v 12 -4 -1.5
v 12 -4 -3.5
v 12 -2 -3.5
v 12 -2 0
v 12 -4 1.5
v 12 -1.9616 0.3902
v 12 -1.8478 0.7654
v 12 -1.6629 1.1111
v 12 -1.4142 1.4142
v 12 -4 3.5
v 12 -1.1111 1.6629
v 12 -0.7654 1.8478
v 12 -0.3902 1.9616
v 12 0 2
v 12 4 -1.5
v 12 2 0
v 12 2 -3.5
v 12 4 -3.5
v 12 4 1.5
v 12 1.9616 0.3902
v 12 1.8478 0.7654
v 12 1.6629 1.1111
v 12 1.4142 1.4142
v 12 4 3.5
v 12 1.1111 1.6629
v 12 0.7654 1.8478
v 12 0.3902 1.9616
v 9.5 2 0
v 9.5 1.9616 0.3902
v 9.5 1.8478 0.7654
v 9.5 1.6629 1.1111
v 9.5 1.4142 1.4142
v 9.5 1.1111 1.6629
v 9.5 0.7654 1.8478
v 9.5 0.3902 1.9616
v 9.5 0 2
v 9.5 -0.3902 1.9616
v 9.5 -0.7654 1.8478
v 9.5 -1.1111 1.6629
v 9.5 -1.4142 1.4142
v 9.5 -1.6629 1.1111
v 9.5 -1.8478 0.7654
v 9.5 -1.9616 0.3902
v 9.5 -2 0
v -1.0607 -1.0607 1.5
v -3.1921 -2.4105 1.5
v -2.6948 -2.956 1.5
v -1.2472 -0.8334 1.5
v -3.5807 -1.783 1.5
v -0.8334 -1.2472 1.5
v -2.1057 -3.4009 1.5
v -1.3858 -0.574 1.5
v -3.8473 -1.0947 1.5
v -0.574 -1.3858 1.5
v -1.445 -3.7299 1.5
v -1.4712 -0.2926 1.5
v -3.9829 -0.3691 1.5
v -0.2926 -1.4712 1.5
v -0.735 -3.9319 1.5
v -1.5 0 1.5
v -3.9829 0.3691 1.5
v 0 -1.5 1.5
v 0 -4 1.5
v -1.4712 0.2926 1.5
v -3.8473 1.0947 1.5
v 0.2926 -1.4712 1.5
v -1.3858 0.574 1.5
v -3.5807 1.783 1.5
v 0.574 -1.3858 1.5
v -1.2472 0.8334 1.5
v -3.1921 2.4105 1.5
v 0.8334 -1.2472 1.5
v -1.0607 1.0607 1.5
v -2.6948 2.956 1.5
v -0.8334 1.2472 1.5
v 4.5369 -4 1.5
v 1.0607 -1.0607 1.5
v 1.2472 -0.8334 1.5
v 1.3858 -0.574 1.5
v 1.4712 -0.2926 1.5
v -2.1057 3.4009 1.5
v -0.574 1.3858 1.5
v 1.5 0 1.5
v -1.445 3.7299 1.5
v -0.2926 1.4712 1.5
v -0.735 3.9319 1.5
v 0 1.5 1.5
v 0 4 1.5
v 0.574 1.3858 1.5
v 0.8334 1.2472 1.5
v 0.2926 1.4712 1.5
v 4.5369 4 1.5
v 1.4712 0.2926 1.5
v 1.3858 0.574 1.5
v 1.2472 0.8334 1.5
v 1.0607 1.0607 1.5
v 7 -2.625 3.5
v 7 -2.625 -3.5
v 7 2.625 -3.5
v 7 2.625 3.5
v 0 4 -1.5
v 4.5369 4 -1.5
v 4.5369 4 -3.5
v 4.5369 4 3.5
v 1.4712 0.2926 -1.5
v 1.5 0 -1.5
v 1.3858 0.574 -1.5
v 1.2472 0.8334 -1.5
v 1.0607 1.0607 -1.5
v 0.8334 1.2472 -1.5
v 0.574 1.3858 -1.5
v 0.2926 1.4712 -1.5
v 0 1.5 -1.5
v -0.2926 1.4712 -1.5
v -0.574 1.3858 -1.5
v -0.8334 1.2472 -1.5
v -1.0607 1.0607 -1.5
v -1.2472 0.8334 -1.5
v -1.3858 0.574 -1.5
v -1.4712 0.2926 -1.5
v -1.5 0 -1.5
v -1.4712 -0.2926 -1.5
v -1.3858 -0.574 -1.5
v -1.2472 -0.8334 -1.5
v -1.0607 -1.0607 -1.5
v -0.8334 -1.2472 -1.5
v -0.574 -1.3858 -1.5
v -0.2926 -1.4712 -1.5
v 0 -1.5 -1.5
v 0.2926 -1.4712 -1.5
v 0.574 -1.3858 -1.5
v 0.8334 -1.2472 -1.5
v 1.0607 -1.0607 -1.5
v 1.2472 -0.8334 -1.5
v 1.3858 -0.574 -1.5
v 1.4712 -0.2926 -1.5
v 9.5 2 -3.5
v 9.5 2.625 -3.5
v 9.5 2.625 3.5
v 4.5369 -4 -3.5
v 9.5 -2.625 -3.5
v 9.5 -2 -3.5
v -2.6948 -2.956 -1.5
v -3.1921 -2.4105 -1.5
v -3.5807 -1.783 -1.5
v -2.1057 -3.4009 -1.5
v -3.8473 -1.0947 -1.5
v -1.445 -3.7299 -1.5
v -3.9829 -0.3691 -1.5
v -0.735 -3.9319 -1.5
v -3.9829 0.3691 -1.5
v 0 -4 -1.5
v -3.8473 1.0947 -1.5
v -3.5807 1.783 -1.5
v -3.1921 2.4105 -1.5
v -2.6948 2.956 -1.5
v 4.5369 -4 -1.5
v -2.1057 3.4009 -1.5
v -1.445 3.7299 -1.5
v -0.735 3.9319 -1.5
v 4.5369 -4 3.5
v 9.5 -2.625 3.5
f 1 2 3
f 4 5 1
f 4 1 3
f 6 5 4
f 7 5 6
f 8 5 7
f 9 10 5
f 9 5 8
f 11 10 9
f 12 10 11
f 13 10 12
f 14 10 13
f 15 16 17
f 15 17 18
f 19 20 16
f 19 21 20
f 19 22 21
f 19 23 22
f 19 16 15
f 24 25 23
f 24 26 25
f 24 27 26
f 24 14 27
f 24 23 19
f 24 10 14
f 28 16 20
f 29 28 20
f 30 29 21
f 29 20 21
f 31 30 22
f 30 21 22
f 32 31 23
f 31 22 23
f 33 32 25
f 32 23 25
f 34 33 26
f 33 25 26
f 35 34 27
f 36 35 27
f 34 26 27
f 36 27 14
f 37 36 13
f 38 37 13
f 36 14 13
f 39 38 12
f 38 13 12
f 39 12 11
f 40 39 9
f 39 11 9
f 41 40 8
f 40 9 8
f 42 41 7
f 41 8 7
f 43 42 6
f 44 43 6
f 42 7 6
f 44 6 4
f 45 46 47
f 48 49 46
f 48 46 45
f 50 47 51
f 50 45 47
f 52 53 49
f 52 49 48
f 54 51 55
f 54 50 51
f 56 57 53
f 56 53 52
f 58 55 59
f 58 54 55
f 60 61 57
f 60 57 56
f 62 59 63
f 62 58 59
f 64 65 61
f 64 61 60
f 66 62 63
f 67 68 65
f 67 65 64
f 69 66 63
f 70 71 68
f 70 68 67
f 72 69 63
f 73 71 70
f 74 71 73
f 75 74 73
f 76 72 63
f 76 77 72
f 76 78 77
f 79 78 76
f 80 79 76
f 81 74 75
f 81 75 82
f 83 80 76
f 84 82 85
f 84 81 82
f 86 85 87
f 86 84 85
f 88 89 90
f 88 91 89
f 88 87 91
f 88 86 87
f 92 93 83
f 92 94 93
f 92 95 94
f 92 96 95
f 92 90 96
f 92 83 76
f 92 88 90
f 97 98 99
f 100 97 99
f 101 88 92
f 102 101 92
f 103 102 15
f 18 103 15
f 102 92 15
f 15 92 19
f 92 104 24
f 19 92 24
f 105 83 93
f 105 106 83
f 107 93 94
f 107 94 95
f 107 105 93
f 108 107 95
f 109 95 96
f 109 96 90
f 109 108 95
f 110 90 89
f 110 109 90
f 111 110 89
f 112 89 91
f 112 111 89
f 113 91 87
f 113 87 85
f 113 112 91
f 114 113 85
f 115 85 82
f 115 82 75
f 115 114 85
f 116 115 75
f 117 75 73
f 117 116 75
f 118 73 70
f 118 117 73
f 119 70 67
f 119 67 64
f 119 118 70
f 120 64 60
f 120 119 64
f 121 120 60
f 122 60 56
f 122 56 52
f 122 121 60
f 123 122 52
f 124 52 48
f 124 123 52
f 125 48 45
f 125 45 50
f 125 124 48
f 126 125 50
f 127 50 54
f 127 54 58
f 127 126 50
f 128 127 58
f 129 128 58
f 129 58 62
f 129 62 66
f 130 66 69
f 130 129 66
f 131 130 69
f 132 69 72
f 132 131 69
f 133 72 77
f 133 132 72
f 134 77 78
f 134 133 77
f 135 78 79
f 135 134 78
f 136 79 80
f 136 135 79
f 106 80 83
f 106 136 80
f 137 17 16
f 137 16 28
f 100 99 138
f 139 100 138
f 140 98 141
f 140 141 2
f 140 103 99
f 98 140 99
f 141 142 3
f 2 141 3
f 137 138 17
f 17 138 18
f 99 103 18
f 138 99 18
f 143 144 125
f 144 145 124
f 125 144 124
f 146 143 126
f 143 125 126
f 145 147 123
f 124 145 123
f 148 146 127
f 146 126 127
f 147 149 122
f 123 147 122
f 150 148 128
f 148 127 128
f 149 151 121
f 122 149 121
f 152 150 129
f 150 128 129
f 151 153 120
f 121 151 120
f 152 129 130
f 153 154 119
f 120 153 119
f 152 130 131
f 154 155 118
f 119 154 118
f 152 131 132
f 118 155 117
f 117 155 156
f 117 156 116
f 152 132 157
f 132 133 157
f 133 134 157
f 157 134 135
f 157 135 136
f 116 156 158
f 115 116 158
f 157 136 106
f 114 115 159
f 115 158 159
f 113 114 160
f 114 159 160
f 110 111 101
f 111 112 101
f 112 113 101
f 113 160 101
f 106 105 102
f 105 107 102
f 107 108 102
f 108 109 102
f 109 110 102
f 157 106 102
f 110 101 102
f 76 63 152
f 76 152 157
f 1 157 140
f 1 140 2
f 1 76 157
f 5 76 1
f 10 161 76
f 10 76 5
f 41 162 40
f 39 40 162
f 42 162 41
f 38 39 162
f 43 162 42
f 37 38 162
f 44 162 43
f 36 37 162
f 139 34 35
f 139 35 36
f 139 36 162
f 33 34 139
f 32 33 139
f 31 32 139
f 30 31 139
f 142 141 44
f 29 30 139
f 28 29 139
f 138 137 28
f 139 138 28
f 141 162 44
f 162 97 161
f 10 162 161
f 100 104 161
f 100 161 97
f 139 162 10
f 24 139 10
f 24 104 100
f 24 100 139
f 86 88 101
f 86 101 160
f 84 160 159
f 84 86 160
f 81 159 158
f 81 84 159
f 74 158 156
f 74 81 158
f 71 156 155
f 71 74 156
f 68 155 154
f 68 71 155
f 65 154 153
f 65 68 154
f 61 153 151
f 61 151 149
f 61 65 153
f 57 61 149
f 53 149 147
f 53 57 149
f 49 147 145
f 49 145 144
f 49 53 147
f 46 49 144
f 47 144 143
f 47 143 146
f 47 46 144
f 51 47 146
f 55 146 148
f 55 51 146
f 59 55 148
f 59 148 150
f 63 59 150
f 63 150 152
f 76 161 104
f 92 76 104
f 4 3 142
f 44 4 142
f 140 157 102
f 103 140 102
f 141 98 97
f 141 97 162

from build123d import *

# Parameters (mm, degrees)
SKETCH1_R               = 1.5
BOSS_EXTRUDE1_DEPTH     = 1.5
SKETCH5_W               = 7.463090523
SKETCH5_H               = 8
BOSS_EXTRUDE2_DEPTH     = 3.5
CUT_EXTRUDE1_DEPTH      = 7
CUT_EXTRUDE1_DEPTH_BACK = 6
SKETCH2_W               = 2.5
SKETCH2_H               = 5.25
SKETCH3_R               = 2
CUT_EXTRUDE2_DEPTH      = 3
SKETCH6_W               = 5
SKETCH6_H               = 4
CUT_EXTRUDE3_DEPTH      = 3.5


with BuildPart() as part:
    # Sketch1 → Boss-Extrude1 (new, symmetric)
    with BuildSketch(Plane.XY):
        with BuildLine():
            Line((12, 4), (0, 4))
            ThreePointArc((0, 4), (-4, 0), (0, -4))
            Line((0, -4), (12, -4))
            Line((12, -4), (12, 4))
        make_face()
        Circle(SKETCH1_R, mode=Mode.SUBTRACT)
    extrude(amount=BOSS_EXTRUDE1_DEPTH, both=True)

    # Sketch5 → Boss-Extrude2 (add, symmetric)
    with BuildSketch(Plane.XY):
        with Locations((8.268454739, 0)):
            Rectangle(SKETCH5_W, SKETCH5_H)
    extrude(amount=BOSS_EXTRUDE2_DEPTH, both=True)

    # Sketch2 → Cut-Extrude1 (cut, two sides: drawn at the far end of the back side and taken through both)
    with BuildSketch(Plane.XY.offset(1.5).offset(-CUT_EXTRUDE1_DEPTH_BACK)):
        with Locations((8.25, 0)):
            Rectangle(SKETCH2_W, SKETCH2_H)
    extrude(amount=CUT_EXTRUDE1_DEPTH + CUT_EXTRUDE1_DEPTH_BACK, mode=Mode.SUBTRACT)

    # Sketch3 → Cut-Extrude2 (cut)
    with BuildSketch(Plane(origin=(12, 0, 0), x_dir=(0, 0, -1), z_dir=(1, 0, 0))):
        with Locations(Location((0, 0, 0), (0, 0, 90))):
            Circle(SKETCH3_R)
    extrude(amount=-CUT_EXTRUDE2_DEPTH, mode=Mode.SUBTRACT)

    # Sketch6 → Cut-Extrude3 (cut)
    with BuildSketch(Plane(origin=(0, 0, -3.5), x_dir=(-1, 0, 0), z_dir=(0, 0, -1))):
        with Locations((-12, 0)):
            Rectangle(SKETCH6_W, SKETCH6_H)
    extrude(amount=-CUT_EXTRUDE3_DEPTH, mode=Mode.SUBTRACT)


solid = part.part
